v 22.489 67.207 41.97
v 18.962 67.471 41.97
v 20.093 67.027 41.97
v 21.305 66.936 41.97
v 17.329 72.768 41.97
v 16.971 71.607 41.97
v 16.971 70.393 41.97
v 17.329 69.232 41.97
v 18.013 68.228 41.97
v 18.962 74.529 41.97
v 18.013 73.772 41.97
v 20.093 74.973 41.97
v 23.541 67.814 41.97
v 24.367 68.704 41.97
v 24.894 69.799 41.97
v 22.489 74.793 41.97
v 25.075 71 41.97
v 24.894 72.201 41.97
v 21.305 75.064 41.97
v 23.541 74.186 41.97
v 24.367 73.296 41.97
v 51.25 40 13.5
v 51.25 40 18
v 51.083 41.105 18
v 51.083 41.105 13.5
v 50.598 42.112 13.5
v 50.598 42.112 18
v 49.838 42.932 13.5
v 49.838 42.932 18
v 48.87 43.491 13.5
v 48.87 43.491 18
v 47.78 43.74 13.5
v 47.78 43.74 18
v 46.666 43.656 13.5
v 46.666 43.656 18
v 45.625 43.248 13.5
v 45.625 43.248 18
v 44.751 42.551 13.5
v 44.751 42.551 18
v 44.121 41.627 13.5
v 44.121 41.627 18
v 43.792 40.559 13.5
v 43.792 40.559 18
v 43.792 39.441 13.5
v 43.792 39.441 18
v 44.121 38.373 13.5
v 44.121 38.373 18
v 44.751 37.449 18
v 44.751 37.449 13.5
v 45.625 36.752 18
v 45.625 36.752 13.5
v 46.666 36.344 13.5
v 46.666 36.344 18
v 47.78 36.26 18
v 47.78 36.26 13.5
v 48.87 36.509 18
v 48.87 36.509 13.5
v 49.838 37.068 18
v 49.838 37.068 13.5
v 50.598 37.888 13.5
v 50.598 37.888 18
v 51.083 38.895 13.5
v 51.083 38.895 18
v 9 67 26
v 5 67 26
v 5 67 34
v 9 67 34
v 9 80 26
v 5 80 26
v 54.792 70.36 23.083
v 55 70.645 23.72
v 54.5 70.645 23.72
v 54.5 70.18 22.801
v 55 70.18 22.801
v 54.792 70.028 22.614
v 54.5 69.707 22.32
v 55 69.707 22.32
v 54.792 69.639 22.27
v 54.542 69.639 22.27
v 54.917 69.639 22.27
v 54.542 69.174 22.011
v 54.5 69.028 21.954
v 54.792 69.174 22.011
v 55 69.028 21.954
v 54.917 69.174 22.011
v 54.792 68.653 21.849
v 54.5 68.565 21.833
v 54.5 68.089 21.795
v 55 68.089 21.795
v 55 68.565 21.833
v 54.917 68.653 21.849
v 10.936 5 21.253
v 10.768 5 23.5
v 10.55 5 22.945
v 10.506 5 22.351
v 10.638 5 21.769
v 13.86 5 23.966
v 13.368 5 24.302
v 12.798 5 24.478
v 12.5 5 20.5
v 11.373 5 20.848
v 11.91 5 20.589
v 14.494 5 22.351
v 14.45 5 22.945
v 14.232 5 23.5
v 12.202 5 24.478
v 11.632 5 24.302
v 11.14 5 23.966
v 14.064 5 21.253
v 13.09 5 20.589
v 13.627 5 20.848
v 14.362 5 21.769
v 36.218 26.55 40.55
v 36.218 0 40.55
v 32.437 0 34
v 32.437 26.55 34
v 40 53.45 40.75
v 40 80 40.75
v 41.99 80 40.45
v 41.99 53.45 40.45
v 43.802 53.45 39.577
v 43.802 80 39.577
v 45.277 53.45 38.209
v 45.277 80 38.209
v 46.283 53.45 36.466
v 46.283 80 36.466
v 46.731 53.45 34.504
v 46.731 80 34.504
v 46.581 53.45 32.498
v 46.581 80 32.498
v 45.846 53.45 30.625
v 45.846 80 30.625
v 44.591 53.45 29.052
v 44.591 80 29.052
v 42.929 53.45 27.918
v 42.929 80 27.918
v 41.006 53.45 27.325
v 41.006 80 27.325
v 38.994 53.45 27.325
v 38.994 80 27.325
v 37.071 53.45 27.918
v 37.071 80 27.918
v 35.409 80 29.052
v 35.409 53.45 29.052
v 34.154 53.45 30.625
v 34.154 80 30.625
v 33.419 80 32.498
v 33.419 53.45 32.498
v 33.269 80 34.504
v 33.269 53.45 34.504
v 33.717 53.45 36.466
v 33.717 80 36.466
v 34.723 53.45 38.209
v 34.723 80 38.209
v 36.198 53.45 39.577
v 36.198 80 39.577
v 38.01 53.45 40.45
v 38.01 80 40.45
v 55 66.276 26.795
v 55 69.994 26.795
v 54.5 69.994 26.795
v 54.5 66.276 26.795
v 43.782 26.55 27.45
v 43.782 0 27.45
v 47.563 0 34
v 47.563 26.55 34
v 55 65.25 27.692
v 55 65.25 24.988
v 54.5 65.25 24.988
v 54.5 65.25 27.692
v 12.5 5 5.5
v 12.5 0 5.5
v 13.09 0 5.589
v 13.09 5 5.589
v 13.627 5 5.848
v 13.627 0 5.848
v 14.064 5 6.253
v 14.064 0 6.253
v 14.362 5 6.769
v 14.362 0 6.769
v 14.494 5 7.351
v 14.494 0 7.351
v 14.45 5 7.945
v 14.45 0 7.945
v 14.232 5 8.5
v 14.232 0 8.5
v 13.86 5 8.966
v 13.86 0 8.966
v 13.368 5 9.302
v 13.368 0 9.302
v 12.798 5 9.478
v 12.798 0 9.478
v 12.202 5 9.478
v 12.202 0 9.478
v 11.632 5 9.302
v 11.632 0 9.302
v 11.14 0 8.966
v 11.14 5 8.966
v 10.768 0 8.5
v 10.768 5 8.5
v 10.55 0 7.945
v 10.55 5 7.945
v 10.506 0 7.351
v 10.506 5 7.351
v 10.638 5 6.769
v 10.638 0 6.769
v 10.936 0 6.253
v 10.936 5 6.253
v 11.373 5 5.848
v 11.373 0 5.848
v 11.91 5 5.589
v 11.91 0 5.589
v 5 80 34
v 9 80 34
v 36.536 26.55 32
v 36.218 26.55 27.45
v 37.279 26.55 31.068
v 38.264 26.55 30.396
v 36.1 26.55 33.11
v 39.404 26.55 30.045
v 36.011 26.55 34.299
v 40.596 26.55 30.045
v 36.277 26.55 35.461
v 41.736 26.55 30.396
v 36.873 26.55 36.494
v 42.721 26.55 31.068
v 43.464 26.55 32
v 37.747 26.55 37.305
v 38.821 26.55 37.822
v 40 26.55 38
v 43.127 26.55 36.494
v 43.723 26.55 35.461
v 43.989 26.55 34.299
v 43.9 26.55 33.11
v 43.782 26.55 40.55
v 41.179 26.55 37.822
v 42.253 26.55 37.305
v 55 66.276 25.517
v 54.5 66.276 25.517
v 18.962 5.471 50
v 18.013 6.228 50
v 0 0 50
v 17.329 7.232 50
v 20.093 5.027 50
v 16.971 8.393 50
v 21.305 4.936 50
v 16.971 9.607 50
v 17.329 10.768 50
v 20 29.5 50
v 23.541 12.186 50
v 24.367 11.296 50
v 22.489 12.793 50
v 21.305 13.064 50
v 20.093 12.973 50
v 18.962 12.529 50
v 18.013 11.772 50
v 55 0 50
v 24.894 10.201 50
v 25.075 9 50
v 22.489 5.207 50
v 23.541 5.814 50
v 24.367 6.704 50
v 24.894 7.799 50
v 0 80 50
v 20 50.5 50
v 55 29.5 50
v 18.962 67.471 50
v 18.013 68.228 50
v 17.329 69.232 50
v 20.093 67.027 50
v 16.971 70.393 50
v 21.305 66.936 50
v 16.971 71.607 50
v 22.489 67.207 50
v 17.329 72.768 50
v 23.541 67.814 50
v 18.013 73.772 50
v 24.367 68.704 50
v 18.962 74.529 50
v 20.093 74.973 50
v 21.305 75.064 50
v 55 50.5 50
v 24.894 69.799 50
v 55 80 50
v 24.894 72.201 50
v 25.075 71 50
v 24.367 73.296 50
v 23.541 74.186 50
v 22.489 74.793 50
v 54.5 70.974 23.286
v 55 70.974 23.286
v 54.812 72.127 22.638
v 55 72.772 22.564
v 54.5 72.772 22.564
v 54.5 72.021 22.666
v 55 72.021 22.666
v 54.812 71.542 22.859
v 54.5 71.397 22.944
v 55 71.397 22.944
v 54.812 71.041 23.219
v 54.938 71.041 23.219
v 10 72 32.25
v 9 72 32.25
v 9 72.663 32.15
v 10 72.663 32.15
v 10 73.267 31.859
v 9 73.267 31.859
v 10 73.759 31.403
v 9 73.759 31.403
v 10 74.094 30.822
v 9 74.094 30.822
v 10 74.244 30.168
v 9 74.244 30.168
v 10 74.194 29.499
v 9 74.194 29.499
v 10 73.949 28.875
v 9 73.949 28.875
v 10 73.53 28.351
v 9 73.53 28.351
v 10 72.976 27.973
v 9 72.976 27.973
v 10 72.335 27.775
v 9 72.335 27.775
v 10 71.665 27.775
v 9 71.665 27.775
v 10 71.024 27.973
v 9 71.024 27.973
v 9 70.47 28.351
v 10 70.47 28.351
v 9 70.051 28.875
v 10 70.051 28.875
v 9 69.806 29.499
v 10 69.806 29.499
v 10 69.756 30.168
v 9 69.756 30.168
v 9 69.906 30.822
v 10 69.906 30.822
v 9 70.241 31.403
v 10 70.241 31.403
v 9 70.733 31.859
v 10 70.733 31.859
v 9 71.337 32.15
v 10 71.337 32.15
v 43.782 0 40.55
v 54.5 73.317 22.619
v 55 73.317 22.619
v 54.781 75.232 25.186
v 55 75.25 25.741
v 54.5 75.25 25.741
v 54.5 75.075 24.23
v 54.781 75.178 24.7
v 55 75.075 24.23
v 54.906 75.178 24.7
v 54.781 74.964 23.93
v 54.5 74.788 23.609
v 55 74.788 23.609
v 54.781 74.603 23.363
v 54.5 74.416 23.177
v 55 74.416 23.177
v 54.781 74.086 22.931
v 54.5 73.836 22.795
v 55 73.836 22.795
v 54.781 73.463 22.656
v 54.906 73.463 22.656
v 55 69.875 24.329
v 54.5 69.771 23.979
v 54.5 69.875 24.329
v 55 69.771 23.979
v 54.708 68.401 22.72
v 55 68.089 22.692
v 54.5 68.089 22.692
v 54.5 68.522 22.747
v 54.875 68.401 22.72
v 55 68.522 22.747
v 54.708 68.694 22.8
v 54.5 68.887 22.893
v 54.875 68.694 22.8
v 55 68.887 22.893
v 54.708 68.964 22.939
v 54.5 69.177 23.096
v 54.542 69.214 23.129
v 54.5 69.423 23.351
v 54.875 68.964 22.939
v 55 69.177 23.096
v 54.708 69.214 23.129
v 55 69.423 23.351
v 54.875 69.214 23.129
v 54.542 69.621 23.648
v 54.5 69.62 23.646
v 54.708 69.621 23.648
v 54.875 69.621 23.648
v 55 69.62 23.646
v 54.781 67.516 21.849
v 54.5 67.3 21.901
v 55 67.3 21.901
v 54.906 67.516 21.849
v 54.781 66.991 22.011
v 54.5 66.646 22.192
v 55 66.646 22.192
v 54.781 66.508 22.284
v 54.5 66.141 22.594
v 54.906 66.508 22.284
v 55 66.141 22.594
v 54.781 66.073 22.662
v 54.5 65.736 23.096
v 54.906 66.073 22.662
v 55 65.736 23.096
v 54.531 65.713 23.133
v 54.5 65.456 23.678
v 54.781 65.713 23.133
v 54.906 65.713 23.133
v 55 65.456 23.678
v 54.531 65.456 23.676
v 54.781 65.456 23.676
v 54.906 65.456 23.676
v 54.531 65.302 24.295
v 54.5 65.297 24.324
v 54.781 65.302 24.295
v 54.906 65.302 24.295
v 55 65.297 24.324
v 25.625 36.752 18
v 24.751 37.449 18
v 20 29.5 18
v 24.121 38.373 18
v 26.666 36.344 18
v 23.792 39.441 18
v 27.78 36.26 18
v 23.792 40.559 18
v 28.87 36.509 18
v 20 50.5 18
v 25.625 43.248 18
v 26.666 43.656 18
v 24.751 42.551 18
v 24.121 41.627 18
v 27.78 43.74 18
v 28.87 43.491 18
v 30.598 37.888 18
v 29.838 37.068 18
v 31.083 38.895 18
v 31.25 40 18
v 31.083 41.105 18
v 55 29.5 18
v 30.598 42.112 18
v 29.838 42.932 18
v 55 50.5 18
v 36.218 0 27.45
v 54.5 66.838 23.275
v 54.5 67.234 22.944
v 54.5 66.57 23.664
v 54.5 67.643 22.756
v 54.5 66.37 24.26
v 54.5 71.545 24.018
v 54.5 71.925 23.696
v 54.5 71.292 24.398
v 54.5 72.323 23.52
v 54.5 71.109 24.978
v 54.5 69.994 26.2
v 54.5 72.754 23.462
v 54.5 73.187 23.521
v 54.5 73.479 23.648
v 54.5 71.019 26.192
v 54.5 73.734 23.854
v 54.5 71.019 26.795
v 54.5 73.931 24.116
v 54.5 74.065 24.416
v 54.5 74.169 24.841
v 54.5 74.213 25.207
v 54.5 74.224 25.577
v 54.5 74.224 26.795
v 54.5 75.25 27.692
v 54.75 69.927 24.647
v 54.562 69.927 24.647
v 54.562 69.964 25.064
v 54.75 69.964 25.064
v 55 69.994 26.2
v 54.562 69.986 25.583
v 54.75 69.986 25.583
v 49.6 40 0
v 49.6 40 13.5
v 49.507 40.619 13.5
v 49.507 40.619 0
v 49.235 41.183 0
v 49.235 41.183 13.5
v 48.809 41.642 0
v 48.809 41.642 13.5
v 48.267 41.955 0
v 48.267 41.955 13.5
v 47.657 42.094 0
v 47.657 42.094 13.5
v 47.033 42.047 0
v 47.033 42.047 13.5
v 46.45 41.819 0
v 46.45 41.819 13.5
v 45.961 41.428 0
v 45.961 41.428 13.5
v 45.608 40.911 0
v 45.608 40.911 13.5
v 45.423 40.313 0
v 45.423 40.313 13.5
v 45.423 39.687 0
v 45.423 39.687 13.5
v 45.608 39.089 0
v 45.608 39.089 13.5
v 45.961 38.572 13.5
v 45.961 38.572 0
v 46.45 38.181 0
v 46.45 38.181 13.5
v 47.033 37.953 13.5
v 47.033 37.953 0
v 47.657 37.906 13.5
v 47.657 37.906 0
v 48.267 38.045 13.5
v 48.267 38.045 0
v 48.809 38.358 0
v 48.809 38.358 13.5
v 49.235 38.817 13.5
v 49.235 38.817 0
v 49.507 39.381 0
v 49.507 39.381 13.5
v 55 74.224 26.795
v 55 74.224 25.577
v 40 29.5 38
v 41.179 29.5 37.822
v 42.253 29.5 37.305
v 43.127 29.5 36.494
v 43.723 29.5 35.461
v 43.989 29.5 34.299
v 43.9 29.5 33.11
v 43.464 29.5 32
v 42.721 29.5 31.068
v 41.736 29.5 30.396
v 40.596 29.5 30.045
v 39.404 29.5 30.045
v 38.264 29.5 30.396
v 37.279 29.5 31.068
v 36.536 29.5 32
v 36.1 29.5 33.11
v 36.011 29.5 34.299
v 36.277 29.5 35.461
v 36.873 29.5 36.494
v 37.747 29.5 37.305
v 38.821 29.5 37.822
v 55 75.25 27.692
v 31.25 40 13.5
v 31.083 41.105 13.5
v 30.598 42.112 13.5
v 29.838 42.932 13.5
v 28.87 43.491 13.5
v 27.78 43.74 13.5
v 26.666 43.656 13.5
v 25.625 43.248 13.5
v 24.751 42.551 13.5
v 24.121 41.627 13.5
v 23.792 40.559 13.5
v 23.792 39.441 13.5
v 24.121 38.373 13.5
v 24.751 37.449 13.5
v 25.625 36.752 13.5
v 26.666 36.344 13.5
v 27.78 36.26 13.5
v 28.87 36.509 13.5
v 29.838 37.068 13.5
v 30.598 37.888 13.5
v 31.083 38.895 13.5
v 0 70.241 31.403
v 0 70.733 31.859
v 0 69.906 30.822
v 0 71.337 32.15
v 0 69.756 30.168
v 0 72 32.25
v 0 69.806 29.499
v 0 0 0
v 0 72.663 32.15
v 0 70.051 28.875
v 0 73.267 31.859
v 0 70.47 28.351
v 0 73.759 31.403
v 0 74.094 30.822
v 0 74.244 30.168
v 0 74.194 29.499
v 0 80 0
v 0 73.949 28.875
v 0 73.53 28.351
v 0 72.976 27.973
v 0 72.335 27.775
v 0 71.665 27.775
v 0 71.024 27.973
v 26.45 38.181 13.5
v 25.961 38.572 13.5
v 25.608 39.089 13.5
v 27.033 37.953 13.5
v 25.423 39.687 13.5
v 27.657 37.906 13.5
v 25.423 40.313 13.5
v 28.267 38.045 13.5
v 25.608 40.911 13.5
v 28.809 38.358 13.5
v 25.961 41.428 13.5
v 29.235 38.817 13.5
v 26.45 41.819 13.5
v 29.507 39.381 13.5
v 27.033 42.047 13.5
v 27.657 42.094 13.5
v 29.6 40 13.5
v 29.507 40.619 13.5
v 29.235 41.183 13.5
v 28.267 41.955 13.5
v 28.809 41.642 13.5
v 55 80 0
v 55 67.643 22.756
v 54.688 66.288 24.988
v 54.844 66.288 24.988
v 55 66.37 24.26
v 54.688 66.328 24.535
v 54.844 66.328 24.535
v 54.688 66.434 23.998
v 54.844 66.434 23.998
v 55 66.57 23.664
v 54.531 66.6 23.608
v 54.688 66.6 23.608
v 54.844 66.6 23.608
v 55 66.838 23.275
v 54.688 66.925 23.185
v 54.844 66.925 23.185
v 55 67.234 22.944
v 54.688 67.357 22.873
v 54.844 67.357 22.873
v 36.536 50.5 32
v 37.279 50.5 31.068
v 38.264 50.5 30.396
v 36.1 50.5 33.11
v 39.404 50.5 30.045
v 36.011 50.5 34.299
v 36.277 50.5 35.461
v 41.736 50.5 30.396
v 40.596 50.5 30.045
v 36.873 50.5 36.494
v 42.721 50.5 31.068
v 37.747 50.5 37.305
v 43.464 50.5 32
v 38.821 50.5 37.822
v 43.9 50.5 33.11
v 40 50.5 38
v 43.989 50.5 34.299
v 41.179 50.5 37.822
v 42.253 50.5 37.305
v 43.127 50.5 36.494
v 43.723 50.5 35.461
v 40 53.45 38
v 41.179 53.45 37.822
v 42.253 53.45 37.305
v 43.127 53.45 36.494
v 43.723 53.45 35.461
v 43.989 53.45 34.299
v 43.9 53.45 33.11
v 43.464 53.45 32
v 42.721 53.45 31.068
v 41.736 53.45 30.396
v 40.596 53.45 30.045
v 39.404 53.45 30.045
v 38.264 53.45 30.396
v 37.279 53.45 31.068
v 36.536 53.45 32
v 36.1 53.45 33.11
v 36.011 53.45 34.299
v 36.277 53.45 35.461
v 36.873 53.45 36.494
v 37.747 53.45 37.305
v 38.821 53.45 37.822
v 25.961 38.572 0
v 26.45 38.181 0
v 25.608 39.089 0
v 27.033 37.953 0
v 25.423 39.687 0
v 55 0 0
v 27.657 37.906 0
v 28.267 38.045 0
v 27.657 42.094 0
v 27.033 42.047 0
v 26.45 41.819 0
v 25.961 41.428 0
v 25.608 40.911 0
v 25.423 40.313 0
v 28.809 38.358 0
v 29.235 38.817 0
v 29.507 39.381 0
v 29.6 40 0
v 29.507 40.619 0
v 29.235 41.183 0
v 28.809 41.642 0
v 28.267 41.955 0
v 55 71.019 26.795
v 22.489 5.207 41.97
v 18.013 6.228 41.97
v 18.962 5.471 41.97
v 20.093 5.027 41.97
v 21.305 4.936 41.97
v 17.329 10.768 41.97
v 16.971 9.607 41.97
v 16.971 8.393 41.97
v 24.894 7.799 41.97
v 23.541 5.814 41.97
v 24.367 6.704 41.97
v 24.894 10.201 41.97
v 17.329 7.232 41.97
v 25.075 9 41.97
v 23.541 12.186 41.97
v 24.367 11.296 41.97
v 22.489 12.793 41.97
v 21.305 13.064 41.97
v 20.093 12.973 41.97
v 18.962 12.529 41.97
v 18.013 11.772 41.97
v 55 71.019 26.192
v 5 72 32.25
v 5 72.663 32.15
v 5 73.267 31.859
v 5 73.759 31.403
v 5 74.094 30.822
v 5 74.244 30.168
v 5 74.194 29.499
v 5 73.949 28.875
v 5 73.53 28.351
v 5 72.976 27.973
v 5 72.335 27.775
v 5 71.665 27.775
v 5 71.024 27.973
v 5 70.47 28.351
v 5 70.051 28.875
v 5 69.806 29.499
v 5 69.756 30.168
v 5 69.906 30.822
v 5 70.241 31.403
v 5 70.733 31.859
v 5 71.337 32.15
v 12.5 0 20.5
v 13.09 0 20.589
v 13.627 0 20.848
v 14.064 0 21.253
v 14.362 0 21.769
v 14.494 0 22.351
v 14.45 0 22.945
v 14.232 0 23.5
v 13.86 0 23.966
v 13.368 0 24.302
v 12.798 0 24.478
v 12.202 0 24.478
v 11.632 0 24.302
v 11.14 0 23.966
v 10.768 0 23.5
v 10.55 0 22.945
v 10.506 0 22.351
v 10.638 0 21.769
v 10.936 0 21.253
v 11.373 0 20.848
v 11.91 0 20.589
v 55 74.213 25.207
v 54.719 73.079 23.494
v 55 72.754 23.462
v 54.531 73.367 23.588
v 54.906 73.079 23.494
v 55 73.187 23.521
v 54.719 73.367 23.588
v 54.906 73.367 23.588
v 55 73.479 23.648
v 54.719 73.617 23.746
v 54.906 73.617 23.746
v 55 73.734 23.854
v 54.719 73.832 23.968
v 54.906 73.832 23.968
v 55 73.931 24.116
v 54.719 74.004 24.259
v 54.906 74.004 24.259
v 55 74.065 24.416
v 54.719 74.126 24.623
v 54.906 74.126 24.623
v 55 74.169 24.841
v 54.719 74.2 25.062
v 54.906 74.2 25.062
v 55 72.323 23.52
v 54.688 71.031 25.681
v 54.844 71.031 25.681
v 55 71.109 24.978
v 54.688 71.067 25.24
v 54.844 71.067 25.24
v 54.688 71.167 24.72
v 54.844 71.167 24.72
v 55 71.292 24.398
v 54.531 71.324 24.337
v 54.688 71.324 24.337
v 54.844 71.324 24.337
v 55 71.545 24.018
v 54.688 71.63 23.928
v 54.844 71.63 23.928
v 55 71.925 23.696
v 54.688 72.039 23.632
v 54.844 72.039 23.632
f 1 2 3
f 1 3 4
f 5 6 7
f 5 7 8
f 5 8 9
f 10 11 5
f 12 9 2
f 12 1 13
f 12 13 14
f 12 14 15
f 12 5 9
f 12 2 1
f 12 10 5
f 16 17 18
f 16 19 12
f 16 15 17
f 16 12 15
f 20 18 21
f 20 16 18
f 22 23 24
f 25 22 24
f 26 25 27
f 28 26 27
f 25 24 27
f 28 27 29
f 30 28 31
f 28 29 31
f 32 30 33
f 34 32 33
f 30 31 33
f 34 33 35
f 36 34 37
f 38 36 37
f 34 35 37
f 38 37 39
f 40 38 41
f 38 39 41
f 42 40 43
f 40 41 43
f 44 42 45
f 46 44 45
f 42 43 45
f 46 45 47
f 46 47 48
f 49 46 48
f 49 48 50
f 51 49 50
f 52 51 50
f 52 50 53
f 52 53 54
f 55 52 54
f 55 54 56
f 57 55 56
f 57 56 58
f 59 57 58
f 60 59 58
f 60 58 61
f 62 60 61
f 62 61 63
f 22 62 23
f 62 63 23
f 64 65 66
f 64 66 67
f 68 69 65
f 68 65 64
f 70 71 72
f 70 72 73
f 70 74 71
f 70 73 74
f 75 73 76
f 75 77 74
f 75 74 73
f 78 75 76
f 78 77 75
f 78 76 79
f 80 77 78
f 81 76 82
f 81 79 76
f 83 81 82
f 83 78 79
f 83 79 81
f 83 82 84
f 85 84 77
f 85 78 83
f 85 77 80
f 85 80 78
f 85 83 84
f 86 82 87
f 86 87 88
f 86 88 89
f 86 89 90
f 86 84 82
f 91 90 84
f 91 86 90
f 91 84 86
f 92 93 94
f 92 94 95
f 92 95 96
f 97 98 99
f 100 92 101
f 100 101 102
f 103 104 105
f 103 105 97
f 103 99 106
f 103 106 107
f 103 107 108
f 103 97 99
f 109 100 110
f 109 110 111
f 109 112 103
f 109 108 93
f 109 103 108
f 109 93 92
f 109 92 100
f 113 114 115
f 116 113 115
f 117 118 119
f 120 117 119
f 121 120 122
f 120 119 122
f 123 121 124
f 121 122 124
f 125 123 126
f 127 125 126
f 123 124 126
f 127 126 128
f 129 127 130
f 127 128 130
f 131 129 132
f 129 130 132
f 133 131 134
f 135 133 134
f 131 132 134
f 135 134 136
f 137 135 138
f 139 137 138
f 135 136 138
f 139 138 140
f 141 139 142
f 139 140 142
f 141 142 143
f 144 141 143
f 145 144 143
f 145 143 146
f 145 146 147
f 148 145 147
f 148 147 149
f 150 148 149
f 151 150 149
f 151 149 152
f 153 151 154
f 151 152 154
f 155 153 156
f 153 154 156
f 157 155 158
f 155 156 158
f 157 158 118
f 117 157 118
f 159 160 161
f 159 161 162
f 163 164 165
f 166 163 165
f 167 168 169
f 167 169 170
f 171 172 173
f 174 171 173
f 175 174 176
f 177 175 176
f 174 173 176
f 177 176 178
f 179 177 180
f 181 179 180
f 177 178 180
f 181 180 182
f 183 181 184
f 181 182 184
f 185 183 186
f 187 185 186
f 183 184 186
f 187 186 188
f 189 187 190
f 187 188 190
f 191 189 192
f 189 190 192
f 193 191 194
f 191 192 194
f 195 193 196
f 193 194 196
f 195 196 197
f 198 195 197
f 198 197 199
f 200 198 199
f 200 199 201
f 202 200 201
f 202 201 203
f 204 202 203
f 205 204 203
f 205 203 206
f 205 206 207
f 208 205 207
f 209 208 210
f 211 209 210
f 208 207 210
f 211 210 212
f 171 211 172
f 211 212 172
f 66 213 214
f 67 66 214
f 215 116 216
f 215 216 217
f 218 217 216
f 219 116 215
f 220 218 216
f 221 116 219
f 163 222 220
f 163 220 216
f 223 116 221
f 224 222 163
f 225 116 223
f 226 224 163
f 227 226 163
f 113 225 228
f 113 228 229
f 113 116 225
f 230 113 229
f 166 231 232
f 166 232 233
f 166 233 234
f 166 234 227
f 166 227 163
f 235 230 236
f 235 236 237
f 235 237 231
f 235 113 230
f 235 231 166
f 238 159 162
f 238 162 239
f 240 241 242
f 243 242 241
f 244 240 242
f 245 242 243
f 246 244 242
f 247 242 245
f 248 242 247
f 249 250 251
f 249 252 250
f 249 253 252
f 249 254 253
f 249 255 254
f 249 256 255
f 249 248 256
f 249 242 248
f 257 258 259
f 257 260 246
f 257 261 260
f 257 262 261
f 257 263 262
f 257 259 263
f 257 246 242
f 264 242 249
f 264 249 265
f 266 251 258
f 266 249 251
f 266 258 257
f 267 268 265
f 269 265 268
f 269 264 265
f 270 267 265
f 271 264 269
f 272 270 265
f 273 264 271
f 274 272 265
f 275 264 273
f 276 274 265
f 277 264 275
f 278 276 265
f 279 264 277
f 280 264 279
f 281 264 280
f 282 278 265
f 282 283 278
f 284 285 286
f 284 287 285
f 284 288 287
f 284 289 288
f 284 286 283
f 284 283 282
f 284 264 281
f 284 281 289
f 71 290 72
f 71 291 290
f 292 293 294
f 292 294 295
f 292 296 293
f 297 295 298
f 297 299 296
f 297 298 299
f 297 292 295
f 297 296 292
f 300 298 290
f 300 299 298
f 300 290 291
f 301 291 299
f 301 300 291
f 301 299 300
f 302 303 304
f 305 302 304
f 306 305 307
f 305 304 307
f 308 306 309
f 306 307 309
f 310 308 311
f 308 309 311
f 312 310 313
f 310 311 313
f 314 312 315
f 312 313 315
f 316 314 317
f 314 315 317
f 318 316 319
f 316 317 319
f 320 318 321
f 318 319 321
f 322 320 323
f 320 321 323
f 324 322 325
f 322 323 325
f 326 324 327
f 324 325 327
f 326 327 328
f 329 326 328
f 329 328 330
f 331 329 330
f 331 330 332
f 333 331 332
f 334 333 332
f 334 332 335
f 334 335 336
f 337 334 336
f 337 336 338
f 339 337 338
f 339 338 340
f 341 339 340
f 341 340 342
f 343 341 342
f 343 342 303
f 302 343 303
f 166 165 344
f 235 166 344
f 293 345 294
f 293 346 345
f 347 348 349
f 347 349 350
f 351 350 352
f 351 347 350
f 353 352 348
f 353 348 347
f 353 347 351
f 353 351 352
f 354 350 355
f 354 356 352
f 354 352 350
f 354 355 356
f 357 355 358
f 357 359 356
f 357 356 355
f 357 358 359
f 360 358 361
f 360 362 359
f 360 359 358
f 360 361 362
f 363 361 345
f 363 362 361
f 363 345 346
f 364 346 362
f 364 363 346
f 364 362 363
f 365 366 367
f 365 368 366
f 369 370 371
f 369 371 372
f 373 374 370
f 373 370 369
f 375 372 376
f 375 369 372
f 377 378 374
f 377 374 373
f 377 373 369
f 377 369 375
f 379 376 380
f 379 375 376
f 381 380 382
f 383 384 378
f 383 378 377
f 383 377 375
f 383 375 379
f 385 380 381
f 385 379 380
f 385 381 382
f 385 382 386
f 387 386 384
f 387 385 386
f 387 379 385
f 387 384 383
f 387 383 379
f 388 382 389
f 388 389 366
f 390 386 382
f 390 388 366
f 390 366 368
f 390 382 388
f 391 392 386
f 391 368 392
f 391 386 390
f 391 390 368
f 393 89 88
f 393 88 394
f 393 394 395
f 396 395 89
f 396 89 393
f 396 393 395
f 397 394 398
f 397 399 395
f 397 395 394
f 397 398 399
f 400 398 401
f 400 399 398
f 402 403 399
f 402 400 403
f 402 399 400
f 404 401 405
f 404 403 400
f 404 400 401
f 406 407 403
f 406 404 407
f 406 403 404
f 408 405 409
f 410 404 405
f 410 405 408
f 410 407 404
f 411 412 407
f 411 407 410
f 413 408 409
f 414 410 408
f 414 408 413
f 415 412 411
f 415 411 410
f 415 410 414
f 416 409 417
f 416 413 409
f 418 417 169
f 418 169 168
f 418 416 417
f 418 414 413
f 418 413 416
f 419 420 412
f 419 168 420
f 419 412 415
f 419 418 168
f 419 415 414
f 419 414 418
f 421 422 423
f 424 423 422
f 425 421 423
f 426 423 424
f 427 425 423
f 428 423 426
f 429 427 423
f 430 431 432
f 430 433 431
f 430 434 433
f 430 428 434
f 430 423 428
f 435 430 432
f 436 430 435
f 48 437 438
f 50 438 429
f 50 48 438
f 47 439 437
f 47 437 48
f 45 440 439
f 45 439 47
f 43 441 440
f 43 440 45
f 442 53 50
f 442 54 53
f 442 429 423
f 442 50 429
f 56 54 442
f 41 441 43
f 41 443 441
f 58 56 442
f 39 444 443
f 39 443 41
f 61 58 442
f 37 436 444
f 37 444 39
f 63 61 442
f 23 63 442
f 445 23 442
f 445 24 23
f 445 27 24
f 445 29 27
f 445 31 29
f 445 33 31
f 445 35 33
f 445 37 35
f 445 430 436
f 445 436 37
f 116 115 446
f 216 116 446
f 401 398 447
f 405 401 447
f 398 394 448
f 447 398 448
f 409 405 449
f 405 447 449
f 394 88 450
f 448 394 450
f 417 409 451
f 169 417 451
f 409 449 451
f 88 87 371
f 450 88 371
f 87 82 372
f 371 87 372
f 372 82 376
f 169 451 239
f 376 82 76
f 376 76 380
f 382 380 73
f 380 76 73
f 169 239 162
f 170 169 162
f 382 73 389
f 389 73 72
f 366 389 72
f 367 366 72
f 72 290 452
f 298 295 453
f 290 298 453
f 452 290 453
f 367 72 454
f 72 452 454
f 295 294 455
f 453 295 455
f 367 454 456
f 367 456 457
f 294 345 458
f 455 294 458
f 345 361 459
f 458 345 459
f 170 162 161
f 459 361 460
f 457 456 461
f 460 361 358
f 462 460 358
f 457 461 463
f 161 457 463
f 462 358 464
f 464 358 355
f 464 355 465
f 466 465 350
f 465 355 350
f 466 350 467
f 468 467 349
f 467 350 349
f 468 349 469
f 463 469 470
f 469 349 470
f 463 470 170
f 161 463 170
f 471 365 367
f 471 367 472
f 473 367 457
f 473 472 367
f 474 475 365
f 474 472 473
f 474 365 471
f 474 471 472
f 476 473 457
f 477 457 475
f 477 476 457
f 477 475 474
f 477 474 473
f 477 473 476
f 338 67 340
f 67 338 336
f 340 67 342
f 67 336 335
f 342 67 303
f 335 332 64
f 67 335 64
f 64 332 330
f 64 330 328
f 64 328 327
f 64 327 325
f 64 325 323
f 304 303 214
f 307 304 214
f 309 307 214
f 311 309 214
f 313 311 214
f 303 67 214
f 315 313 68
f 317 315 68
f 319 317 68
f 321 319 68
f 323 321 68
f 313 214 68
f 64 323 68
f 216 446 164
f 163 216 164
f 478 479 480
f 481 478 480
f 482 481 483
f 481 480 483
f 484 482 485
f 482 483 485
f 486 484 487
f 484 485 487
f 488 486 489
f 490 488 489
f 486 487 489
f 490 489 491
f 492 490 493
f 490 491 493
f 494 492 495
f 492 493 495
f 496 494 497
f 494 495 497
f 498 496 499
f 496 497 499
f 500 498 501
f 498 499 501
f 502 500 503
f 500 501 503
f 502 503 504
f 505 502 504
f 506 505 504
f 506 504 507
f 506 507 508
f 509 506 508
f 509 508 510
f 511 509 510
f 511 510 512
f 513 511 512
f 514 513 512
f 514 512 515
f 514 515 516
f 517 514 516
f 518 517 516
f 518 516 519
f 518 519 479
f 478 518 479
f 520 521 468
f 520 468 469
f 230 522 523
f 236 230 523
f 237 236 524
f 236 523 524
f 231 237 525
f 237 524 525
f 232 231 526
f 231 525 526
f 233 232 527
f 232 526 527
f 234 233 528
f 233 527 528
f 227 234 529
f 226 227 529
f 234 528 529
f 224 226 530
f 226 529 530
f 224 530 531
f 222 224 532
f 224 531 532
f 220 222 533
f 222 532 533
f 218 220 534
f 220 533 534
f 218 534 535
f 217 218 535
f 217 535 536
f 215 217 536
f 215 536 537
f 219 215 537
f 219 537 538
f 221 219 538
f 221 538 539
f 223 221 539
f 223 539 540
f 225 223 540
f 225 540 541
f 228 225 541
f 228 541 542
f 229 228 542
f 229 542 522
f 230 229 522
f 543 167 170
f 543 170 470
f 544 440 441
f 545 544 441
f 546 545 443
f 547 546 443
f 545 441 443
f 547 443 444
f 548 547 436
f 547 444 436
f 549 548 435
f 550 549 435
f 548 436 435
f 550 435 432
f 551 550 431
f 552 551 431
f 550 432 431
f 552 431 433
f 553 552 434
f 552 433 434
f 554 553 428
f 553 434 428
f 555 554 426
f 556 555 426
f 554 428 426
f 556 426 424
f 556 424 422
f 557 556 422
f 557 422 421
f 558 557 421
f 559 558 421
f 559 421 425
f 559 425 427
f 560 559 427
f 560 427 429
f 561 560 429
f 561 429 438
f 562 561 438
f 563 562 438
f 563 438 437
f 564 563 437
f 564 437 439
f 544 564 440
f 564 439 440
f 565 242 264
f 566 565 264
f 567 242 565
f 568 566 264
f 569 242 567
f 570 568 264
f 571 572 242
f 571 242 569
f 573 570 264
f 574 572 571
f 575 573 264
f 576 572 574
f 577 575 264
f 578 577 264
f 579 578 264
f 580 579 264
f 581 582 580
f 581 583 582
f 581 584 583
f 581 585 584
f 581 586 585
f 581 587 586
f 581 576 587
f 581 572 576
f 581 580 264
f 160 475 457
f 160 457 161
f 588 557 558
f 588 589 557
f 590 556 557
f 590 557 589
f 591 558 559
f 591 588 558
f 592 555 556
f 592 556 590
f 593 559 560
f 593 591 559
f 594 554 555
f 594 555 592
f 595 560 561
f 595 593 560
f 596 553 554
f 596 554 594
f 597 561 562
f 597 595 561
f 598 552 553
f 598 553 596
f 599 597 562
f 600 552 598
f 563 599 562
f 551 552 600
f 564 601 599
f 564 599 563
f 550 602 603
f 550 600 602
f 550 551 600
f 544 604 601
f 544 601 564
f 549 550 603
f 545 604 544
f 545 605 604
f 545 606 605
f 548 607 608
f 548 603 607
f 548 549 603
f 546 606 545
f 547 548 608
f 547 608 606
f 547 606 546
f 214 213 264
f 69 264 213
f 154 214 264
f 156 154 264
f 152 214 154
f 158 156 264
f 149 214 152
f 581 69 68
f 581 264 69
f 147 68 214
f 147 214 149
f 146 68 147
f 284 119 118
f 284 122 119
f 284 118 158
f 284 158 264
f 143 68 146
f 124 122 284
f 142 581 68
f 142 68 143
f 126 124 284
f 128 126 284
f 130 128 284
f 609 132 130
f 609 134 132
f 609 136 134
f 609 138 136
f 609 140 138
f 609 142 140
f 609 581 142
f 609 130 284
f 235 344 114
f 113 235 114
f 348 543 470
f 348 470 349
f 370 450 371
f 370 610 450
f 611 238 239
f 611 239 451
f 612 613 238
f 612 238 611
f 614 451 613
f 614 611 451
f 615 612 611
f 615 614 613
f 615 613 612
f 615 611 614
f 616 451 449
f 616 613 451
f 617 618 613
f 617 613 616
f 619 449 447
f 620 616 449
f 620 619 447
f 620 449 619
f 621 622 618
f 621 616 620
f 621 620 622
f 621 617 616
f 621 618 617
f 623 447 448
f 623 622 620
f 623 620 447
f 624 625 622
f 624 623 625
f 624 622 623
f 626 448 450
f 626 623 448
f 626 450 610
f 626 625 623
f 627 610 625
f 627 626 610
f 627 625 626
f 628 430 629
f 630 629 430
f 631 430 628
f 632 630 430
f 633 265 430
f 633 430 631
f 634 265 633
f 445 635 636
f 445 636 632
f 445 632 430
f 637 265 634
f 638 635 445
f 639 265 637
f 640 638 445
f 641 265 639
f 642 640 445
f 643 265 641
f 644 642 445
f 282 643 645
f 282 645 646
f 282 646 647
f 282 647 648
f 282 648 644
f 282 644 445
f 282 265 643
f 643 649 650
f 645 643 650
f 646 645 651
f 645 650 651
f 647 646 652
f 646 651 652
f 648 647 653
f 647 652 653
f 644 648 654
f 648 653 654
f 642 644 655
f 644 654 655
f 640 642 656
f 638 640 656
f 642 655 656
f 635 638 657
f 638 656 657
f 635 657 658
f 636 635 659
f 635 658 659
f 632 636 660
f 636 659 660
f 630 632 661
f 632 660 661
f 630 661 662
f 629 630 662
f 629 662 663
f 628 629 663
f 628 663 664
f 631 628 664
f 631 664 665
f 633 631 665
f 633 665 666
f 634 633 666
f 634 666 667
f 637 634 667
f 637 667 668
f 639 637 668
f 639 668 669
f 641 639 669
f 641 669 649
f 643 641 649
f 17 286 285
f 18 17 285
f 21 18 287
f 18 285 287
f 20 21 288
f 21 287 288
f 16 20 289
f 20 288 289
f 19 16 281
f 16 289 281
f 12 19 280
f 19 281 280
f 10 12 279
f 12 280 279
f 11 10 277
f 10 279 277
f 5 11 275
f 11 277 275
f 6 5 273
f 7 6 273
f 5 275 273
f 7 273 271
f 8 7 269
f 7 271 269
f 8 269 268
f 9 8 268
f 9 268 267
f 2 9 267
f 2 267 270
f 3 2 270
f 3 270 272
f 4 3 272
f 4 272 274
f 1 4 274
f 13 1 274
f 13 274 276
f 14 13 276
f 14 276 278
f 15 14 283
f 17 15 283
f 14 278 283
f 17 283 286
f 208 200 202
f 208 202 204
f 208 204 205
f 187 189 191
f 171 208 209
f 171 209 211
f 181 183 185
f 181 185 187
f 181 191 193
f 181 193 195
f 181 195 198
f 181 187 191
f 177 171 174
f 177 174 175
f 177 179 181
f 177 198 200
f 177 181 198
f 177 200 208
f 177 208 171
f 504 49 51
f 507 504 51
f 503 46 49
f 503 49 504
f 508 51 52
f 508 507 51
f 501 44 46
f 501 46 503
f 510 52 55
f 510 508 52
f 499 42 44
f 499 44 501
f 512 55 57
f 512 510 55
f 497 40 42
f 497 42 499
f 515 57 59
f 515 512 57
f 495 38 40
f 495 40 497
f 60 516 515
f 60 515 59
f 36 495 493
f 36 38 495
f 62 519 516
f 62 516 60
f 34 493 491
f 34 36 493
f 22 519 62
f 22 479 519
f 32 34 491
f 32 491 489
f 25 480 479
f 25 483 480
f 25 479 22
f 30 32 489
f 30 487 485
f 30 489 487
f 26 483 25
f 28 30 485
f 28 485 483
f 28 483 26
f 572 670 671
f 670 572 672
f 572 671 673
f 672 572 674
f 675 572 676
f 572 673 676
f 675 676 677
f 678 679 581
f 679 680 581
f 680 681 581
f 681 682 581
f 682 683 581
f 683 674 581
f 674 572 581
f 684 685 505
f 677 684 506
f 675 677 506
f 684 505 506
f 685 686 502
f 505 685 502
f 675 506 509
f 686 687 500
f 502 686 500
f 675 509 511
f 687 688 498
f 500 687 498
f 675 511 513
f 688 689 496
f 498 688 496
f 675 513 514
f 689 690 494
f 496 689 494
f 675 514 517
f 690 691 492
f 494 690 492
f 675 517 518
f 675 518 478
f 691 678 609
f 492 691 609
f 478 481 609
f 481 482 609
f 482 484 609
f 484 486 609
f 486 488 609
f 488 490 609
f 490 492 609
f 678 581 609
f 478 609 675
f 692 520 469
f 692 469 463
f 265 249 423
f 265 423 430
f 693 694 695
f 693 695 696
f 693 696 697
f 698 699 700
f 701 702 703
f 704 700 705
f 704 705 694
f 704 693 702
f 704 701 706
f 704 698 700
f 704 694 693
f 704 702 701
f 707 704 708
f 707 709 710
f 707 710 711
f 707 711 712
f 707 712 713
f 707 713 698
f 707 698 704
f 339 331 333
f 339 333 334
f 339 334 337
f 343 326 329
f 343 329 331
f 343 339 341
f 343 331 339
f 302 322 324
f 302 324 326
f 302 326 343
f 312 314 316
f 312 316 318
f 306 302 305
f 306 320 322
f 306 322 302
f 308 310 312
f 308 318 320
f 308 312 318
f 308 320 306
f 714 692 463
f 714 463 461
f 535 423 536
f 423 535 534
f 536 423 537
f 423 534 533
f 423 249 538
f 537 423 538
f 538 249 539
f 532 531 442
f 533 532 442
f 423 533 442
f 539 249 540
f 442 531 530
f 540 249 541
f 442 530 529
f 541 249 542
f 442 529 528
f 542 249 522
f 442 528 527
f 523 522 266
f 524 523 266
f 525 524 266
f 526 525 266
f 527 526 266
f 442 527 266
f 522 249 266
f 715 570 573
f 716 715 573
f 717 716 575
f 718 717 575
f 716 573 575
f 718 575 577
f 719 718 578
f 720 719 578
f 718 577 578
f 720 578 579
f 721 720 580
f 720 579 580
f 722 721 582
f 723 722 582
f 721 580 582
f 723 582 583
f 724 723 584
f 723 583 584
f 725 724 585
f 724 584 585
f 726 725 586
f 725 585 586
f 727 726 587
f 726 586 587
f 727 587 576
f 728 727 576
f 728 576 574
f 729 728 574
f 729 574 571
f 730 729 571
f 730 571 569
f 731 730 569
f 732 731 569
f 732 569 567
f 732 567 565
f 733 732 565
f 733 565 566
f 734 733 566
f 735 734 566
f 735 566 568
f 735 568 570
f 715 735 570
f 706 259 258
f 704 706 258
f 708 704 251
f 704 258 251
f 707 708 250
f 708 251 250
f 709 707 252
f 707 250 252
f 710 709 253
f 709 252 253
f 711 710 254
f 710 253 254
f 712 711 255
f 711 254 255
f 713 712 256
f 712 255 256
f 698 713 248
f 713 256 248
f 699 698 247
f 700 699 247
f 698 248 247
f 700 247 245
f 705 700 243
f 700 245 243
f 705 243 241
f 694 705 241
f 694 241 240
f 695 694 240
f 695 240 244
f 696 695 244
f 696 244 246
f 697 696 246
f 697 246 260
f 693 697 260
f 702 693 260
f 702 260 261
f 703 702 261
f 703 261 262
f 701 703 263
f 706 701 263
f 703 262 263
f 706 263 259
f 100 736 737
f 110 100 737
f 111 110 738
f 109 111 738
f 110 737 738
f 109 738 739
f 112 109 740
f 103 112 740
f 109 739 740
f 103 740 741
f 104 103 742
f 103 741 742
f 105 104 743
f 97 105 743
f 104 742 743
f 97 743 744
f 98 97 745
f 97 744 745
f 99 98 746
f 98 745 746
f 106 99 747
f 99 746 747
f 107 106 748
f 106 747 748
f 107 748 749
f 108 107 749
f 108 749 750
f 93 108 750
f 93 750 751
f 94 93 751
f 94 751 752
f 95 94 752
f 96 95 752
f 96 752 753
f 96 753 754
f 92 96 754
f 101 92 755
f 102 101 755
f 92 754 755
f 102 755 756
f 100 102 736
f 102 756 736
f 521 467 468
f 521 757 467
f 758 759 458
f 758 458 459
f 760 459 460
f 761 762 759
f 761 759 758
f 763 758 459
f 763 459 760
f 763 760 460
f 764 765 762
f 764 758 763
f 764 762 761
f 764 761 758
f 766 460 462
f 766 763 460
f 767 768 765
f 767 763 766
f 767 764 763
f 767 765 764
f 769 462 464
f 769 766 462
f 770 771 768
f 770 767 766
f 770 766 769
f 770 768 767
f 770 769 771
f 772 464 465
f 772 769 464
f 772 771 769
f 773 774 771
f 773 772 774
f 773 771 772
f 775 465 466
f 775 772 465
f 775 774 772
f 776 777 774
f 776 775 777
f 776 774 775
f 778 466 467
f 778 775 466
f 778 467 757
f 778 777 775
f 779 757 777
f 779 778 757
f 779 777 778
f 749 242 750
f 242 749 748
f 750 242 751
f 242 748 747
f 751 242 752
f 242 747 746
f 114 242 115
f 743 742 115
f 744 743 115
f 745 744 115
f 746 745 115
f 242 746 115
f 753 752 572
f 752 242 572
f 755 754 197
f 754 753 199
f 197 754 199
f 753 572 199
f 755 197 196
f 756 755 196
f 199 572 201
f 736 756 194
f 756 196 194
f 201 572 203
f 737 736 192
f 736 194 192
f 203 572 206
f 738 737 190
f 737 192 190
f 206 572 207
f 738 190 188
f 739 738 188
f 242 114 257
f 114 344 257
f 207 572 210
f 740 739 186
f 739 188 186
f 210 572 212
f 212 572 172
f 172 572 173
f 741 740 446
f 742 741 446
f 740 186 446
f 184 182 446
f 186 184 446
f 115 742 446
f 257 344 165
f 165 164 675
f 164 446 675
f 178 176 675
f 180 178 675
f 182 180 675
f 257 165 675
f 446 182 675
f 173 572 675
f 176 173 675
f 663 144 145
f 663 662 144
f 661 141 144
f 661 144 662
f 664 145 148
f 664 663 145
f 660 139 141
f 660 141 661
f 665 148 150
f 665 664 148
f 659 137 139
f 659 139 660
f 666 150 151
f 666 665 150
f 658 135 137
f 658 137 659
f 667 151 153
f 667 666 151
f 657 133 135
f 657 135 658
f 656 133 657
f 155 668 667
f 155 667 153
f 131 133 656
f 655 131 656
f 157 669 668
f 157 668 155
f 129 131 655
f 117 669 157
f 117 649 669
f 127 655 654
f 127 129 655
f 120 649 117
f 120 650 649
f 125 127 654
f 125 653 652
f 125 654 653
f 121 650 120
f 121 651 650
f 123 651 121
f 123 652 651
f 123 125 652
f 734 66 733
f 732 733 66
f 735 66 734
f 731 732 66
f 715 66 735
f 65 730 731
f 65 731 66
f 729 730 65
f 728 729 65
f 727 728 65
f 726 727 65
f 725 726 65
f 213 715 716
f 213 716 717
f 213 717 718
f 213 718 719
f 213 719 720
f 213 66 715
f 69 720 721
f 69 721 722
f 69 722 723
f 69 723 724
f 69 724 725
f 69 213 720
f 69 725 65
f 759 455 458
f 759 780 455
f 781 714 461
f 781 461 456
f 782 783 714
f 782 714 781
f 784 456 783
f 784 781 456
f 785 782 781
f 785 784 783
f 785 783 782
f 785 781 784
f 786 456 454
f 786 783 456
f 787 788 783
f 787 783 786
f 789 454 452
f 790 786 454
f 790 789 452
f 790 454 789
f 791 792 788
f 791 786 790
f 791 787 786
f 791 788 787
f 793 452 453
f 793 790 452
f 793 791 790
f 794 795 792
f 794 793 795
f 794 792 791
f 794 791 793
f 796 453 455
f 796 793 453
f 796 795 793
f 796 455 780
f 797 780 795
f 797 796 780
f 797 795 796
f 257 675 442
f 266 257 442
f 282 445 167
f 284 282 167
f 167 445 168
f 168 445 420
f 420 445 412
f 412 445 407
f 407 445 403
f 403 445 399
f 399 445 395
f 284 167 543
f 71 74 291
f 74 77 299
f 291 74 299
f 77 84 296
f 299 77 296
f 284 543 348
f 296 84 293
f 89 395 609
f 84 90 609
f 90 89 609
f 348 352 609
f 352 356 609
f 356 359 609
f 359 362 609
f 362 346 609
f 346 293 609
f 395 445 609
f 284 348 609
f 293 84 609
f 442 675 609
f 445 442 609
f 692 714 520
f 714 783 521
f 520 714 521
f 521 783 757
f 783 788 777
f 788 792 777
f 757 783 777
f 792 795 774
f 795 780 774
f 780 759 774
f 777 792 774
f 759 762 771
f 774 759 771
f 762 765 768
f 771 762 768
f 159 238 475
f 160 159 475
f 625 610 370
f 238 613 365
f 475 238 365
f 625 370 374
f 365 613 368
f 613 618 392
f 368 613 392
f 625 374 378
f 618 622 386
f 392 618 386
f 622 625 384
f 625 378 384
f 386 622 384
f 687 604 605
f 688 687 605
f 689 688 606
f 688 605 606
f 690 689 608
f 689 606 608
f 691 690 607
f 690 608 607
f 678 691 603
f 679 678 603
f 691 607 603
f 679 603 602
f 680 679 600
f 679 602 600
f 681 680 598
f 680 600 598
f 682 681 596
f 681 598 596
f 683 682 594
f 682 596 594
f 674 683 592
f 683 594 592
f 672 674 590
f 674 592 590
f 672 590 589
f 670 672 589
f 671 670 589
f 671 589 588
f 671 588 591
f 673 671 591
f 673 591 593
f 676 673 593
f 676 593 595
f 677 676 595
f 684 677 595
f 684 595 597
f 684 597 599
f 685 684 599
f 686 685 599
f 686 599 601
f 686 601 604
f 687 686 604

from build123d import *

# Parameters (mm, degrees)
SKETCH2_W           = 55
SKETCH2_H           = 80
BOSS_EXTRUDE1_DEPTH = 50
SKETCH4_R           = 4
CUT_EXTRUDE1_DEPTH  = 110.201648339
SKETCH5_R           = 4.075
CUT_EXTRUDE2_DEPTH  = 8.03
SKETCH6_W           = 35
SKETCH6_H           = 21
CUT_EXTRUDE3_DEPTH  = 32
SKETCH10_R          = 6.75
CUT_EXTRUDE5_DEPTH  = 26.55
CUT_EXTRUDE6_DEPTH  = 26.55
SKETCH12_R          = 2
CUT_EXTRUDE7_DEPTH  = 5
SKETCH13_R          = 2.1
CUT_EXTRUDE8_DEPTH  = 103.220350224
SKETCH13_3_R        = 3.75
CUT_EXTRUDE9_DEPTH  = 4.5
SKETCH14_R          = 2.25
CUT_EXTRUDE10_DEPTH = 10
SKETCH15_W          = 4
SKETCH15_H          = 8
CUT_EXTRUDE11_DEPTH = 13
CUT_EXTRUDE12_DEPTH = 0.5


with BuildPart() as part:
    # Sketch2 → Boss-Extrude1 (new body)
    with BuildSketch(Plane.XY):
        with Locations((27.5, 40)):
            Rectangle(SKETCH2_W, SKETCH2_H)
    extrude(amount=BOSS_EXTRUDE1_DEPTH)

    # Sketch4 → Cut-Extrude1 (cut, through all)
    with BuildSketch(Plane(origin=(0, 80, 0), x_dir=(1, 0, 0), z_dir=(0, 1, 0))):
        with Locations(Location((40, -34, 0), (0, 0, 270))):
            Circle(SKETCH4_R)
    extrude(amount=-CUT_EXTRUDE1_DEPTH, mode=Mode.SUBTRACT)

    # Sketch5 → Cut-Extrude2 (cut)
    with BuildSketch(Plane.XY.offset(50)):
        with Locations((21, 71)):
            Circle(SKETCH5_R)
        with Locations((21, 9)):
            Circle(SKETCH5_R)
    extrude(amount=-CUT_EXTRUDE2_DEPTH, mode=Mode.SUBTRACT)

    # Sketch6 → Cut-Extrude3 (cut)
    with BuildSketch(Plane.XY.offset(50)):
        with Locations((37.5, 40)):
            Rectangle(SKETCH6_W, SKETCH6_H)
    extrude(amount=-CUT_EXTRUDE3_DEPTH, mode=Mode.SUBTRACT)

    # Sketch10 → Cut-Extrude5 (cut)
    with BuildSketch(Plane(origin=(0, 80, 0), x_dir=(1, 0, 0), z_dir=(0, 1, 0))):
        with Locations(Location((40, -34, 0), (0, 0, 270))):
            Circle(SKETCH10_R)
    extrude(amount=-CUT_EXTRUDE5_DEPTH, mode=Mode.SUBTRACT)

    # Sketch11 → Cut-Extrude6 (cut)
    with BuildSketch(Plane.XZ):
        Polygon((47.563288526, 34), (43.781644263, 40.55), (36.218355737, 40.55), (32.436711474, 34), (36.218355737, 27.45), (43.781644263, 27.45), align=None)
    extrude(amount=-CUT_EXTRUDE6_DEPTH, mode=Mode.SUBTRACT)

    # Sketch12 → Cut-Extrude7 (cut)
    with BuildSketch(Plane.XZ):
        with Locations(Location((12.5, 7.5, 0), (0, 0, 270))):
            Circle(SKETCH12_R)
        with Locations(Location((12.5, 22.5, 0), (0, 0, 270))):
            Circle(SKETCH12_R)
    extrude(amount=-CUT_EXTRUDE7_DEPTH, mode=Mode.SUBTRACT)

    # Sketch13 → Cut-Extrude8 (cut, through all)
    with BuildSketch(Plane.XY.offset(18)):
        with Locations((27.5, 40)):
            Circle(SKETCH13_R)
        with Locations((47.5, 40)):
            Circle(SKETCH13_R)
    extrude(amount=-CUT_EXTRUDE8_DEPTH, mode=Mode.SUBTRACT)

    # Sketch13<3> → Cut-Extrude9 (cut)
    with BuildSketch(Plane.XY.offset(18)):
        with Locations((27.5, 40)):
            Circle(SKETCH13_3_R)
        with Locations((47.5, 40)):
            Circle(SKETCH13_3_R)
    extrude(amount=-CUT_EXTRUDE9_DEPTH, mode=Mode.SUBTRACT)

    # Sketch14 → Cut-Extrude10 (cut)
    with BuildSketch(Plane.ZY):
        with Locations((30, 72)):
            Circle(SKETCH14_R)
    extrude(amount=-CUT_EXTRUDE10_DEPTH, mode=Mode.SUBTRACT)

    # Sketch15 → Cut-Extrude11 (cut)
    with BuildSketch(Plane(origin=(0, 80, 0), x_dir=(1, 0, 0), z_dir=(0, 1, 0))):
        with Locations((7, -30)):
            Rectangle(SKETCH15_W, SKETCH15_H)
    extrude(amount=-CUT_EXTRUDE11_DEPTH, mode=Mode.SUBTRACT)

    # Sketch16 → Cut-Extrude12 (cut)
    with BuildSketch(Plane(origin=(55, 0, 0), x_dir=(0, 0, -1), z_dir=(1, 0, 0))):
        with BuildLine():
            Line((-27.692307692, 75.25), (-25.741185897, 75.25))
            add(Edge.make_bspline(
                [(-25.741185897, 75.25), (-25.64567596, 75.249497856), (-25.46055393, 75.248524576), (-25.191355525, 75.233429916), (-24.939216066, 75.212848002), (-24.704062431, 75.180190594), (-24.486003281, 75.140785516), (-24.28438146, 75.093066042), (-24.099838111, 75.035847146), (-23.879516007, 74.944857771), (-23.628314119, 74.809648718), (-23.356318711, 74.609852818), (-23.12373517, 74.365474352), (-22.923202835, 74.089809622), (-22.763771065, 73.78656456), (-22.648430215, 73.462966878), (-22.575407714, 73.123190472), (-22.567897902, 72.88992425), (-22.564102564, 72.772035256)],
                knots=[0, 0, 0, 0, 1.001505555, 1.941167018, 2.826882275, 3.653841531, 4.429895133, 5.150066043, 5.825578002, 6.45369114, 7.647487171, 8.808567382, 9.977351308, 11.170798116, 12.373658725, 13.556498008, 14.765093433, 16, 16, 16, 16], degree=3))
            add(Edge.make_bspline(
                [(-22.564102564, 72.772035256), (-22.567226045, 72.661599383), (-22.573363981, 72.444582477), (-22.632057579, 72.127170736), (-22.723945203, 71.825024397), (-22.851674486, 71.539246153), (-23.01768019, 71.276292972), (-23.214418243, 71.034043641), (-23.451780536, 70.822754907), (-23.629618364, 70.704632328), (-23.719951923, 70.64463141)],
                knots=[0, 0, 0, 0, 1.044552857, 2.05264487, 3.044412934, 4.028983338, 5.005914585, 5.980388656, 6.974128949, 8, 8, 8, 8], degree=3))
            add(Edge.make_bspline(
                [(-23.719951923, 70.64463141), (-23.606350701, 70.601017128), (-23.389003423, 70.517572201), (-23.08990053, 70.370042304), (-22.832200973, 70.209579131), (-22.613923413, 70.034345273), (-22.427244399, 69.845462957), (-22.264235995, 69.640162631), (-22.125146354, 69.415766179), (-22.005966573, 69.174613221), (-21.912970127, 68.919166169), (-21.843324686, 68.651821094), (-21.803417688, 68.373536651), (-21.797738713, 68.184149853), (-21.794871795, 68.088541667)],
                knots=[0, 0, 0, 0, 1.27268992, 2.434971085, 3.483601985, 4.442670788, 5.356604649, 6.2567628, 7.179492994, 8.113709626, 9.066344395, 10.018646069, 10.999752585, 12, 12, 12, 12], degree=3))
            add(Edge.make_bspline(
                [(-21.794871795, 68.088541667), (-21.797662784, 67.990922032), (-21.803154132, 67.798852666), (-21.843668337, 67.516695139), (-21.912265786, 67.247052434), (-22.006754775, 66.988180484), (-22.130075674, 66.740580099), (-22.280155572, 66.503970774), (-22.459102897, 66.280729829), (-22.659282522, 66.06837662), (-22.885745795, 65.877440085), (-23.130076523, 65.707395209), (-23.395351723, 65.567549317), (-23.677214563, 65.45007497), (-23.978826895, 65.360340117), (-24.298834345, 65.297561334), (-24.636960921, 65.255261229), (-24.868988782, 65.2517835), (-24.987980769, 65.25)],
                knots=[0, 0, 0, 0, 0.978564426, 1.925352924, 2.850884081, 3.763762016, 4.682927383, 5.618979971, 6.567305752, 7.547517671, 8.540179244, 9.531824382, 10.526200242, 11.540722885, 12.589160233, 13.674978461, 14.80764778, 16, 16, 16, 16], degree=3))
            Line((-24.987980769, 65.25), (-27.692307692, 65.25))
            Line((-27.692307692, 65.25), (-27.692307692, 75.25))
        make_face()
        with BuildLine():
            Line((-26.794871795, 74.224358974), (-26.794871795, 71.019230769))
            Line((-26.794871795, 71.019230769), (-26.191907051, 71.019230769))
            add(Edge.make_bspline(
                [(-26.191907051, 71.019230769), (-26.103767636, 71.020373406), (-25.933464324, 71.022581214), (-25.686836048, 71.028905549), (-25.457907424, 71.046614244), (-25.247073616, 71.06431785), (-25.054666633, 71.093102386), (-24.881112743, 71.127365595), (-24.72368818, 71.163602466), (-24.542146622, 71.225229572), (-24.336223912, 71.316308644), (-24.116700757, 71.457656747), (-23.923173701, 71.626012042), (-23.759753165, 71.820271932), (-23.626006106, 72.034175321), (-23.533109777, 72.264309265), (-23.470117536, 72.504938213), (-23.464427447, 72.670133221), (-23.461538462, 72.75400641)],
                knots=[0, 0, 0, 0, 1.156816544, 2.235205308, 3.236616184, 4.169592532, 5.011045266, 5.787822928, 6.49130361, 7.128639758, 8.301311294, 9.436451833, 10.541879658, 11.654887649, 12.756523258, 13.837046038, 14.901820046, 16, 16, 16, 16], degree=3))
            add(Edge.make_bspline(
                [(-23.461538462, 72.75400641), (-23.463041833, 72.809508615), (-23.465990862, 72.918382249), (-23.490143155, 73.07709469), (-23.531193368, 73.226362554), (-23.58391992, 73.368231441), (-23.657601887, 73.498265298), (-23.74435464, 73.620960143), (-23.849170898, 73.732137625), (-23.968477505, 73.836050477), (-24.105644999, 73.928177699), (-24.260591547, 74.008865594), (-24.435413482, 74.073839242), (-24.627164496, 74.130742534), (-24.838796175, 74.170709088), (-25.067866327, 74.204004482), (-25.316251239, 74.220955173), (-25.488094389, 74.223199067), (-25.576923077, 74.224358974)],
                knots=[0, 0, 0, 0, 0.91205012, 1.789085906, 2.630437955, 3.453916878, 4.269457761, 5.079663411, 5.91843418, 6.774407191, 7.675494373, 8.627863946, 9.638891023, 10.736472738, 11.911756761, 13.175263542, 14.539845004, 16, 16, 16, 16], degree=3))
            Line((-25.576923077, 74.224358974), (-26.794871795, 74.224358974))
        make_face(mode=Mode.SUBTRACT)
        with BuildLine():
            Line((-26.794871795, 69.993589744), (-26.794871795, 66.275641026))
            Line((-26.794871795, 66.275641026), (-25.516826923, 66.275641026))
            add(Edge.make_bspline(
                [(-25.516826923, 66.275641026), (-25.425344278, 66.276737447), (-25.249023539, 66.278850654), (-24.994448596, 66.285749381), (-24.75849687, 66.301441598), (-24.542245054, 66.326144025), (-24.343358047, 66.352939594), (-24.164221752, 66.388971825), (-24.003384057, 66.43025457), (-23.816886034, 66.49406649), (-23.606876011, 66.593199265), (-23.380559278, 66.742668483), (-23.179341512, 66.920735076), (-23.008469343, 67.126823403), (-22.868432233, 67.350912908), (-22.766559504, 67.588471051), (-22.703728485, 67.835572558), (-22.696122287, 68.004048879), (-22.692307692, 68.088541667)],
                knots=[0, 0, 0, 0, 1.160039823, 2.235823828, 3.228722157, 4.157150951, 4.99529583, 5.772374946, 6.472645482, 7.099169577, 8.269452708, 9.405989375, 10.527446681, 11.663510218, 12.788923519, 13.866172445, 14.929861265, 16, 16, 16, 16], degree=3))
            add(Edge.make_bspline(
                [(-22.692307692, 68.088541667), (-22.693096562, 68.141379782), (-22.694661576, 68.24620373), (-22.718263333, 68.400248928), (-22.752588676, 68.549465709), (-22.796964201, 68.694259253), (-22.86159125, 68.832011757), (-22.937038521, 68.965447641), (-23.025499669, 69.094743297), (-23.163340143, 69.258206878), (-23.363831527, 69.446541201), (-23.648708028, 69.630934064), (-23.97262888, 69.779642085), (-24.207564574, 69.842783446), (-24.328926282, 69.875400641)],
                knots=[0, 0, 0, 0, 0.723448775, 1.435228256, 2.130040452, 2.821711965, 3.505591119, 4.210454504, 4.921174351, 5.648778258, 7.137944449, 8.670945889, 10.280296675, 12, 12, 12, 12], degree=3))
            add(Edge.make_bspline(
                [(-24.328926282, 69.875400641), (-24.377580842, 69.885272309), (-24.483073963, 69.906676123), (-24.655095621, 69.929269561), (-24.851483818, 69.949398304), (-25.072692039, 69.964287326), (-25.319000156, 69.97967745), (-25.590934209, 69.985662653), (-25.88738368, 69.992803396), (-26.093076172, 69.993320923), (-26.199919872, 69.993589744)],
                knots=[0, 0, 0, 0, 0.634451884, 1.375622551, 2.216452059, 3.157844607, 4.20941857, 5.370758133, 6.634282058, 8, 8, 8, 8], degree=3))
            Line((-26.199919872, 69.993589744), (-26.794871795, 69.993589744))
        make_face(mode=Mode.SUBTRACT)
    extrude(amount=-CUT_EXTRUDE12_DEPTH, mode=Mode.SUBTRACT)


solid = part.part
